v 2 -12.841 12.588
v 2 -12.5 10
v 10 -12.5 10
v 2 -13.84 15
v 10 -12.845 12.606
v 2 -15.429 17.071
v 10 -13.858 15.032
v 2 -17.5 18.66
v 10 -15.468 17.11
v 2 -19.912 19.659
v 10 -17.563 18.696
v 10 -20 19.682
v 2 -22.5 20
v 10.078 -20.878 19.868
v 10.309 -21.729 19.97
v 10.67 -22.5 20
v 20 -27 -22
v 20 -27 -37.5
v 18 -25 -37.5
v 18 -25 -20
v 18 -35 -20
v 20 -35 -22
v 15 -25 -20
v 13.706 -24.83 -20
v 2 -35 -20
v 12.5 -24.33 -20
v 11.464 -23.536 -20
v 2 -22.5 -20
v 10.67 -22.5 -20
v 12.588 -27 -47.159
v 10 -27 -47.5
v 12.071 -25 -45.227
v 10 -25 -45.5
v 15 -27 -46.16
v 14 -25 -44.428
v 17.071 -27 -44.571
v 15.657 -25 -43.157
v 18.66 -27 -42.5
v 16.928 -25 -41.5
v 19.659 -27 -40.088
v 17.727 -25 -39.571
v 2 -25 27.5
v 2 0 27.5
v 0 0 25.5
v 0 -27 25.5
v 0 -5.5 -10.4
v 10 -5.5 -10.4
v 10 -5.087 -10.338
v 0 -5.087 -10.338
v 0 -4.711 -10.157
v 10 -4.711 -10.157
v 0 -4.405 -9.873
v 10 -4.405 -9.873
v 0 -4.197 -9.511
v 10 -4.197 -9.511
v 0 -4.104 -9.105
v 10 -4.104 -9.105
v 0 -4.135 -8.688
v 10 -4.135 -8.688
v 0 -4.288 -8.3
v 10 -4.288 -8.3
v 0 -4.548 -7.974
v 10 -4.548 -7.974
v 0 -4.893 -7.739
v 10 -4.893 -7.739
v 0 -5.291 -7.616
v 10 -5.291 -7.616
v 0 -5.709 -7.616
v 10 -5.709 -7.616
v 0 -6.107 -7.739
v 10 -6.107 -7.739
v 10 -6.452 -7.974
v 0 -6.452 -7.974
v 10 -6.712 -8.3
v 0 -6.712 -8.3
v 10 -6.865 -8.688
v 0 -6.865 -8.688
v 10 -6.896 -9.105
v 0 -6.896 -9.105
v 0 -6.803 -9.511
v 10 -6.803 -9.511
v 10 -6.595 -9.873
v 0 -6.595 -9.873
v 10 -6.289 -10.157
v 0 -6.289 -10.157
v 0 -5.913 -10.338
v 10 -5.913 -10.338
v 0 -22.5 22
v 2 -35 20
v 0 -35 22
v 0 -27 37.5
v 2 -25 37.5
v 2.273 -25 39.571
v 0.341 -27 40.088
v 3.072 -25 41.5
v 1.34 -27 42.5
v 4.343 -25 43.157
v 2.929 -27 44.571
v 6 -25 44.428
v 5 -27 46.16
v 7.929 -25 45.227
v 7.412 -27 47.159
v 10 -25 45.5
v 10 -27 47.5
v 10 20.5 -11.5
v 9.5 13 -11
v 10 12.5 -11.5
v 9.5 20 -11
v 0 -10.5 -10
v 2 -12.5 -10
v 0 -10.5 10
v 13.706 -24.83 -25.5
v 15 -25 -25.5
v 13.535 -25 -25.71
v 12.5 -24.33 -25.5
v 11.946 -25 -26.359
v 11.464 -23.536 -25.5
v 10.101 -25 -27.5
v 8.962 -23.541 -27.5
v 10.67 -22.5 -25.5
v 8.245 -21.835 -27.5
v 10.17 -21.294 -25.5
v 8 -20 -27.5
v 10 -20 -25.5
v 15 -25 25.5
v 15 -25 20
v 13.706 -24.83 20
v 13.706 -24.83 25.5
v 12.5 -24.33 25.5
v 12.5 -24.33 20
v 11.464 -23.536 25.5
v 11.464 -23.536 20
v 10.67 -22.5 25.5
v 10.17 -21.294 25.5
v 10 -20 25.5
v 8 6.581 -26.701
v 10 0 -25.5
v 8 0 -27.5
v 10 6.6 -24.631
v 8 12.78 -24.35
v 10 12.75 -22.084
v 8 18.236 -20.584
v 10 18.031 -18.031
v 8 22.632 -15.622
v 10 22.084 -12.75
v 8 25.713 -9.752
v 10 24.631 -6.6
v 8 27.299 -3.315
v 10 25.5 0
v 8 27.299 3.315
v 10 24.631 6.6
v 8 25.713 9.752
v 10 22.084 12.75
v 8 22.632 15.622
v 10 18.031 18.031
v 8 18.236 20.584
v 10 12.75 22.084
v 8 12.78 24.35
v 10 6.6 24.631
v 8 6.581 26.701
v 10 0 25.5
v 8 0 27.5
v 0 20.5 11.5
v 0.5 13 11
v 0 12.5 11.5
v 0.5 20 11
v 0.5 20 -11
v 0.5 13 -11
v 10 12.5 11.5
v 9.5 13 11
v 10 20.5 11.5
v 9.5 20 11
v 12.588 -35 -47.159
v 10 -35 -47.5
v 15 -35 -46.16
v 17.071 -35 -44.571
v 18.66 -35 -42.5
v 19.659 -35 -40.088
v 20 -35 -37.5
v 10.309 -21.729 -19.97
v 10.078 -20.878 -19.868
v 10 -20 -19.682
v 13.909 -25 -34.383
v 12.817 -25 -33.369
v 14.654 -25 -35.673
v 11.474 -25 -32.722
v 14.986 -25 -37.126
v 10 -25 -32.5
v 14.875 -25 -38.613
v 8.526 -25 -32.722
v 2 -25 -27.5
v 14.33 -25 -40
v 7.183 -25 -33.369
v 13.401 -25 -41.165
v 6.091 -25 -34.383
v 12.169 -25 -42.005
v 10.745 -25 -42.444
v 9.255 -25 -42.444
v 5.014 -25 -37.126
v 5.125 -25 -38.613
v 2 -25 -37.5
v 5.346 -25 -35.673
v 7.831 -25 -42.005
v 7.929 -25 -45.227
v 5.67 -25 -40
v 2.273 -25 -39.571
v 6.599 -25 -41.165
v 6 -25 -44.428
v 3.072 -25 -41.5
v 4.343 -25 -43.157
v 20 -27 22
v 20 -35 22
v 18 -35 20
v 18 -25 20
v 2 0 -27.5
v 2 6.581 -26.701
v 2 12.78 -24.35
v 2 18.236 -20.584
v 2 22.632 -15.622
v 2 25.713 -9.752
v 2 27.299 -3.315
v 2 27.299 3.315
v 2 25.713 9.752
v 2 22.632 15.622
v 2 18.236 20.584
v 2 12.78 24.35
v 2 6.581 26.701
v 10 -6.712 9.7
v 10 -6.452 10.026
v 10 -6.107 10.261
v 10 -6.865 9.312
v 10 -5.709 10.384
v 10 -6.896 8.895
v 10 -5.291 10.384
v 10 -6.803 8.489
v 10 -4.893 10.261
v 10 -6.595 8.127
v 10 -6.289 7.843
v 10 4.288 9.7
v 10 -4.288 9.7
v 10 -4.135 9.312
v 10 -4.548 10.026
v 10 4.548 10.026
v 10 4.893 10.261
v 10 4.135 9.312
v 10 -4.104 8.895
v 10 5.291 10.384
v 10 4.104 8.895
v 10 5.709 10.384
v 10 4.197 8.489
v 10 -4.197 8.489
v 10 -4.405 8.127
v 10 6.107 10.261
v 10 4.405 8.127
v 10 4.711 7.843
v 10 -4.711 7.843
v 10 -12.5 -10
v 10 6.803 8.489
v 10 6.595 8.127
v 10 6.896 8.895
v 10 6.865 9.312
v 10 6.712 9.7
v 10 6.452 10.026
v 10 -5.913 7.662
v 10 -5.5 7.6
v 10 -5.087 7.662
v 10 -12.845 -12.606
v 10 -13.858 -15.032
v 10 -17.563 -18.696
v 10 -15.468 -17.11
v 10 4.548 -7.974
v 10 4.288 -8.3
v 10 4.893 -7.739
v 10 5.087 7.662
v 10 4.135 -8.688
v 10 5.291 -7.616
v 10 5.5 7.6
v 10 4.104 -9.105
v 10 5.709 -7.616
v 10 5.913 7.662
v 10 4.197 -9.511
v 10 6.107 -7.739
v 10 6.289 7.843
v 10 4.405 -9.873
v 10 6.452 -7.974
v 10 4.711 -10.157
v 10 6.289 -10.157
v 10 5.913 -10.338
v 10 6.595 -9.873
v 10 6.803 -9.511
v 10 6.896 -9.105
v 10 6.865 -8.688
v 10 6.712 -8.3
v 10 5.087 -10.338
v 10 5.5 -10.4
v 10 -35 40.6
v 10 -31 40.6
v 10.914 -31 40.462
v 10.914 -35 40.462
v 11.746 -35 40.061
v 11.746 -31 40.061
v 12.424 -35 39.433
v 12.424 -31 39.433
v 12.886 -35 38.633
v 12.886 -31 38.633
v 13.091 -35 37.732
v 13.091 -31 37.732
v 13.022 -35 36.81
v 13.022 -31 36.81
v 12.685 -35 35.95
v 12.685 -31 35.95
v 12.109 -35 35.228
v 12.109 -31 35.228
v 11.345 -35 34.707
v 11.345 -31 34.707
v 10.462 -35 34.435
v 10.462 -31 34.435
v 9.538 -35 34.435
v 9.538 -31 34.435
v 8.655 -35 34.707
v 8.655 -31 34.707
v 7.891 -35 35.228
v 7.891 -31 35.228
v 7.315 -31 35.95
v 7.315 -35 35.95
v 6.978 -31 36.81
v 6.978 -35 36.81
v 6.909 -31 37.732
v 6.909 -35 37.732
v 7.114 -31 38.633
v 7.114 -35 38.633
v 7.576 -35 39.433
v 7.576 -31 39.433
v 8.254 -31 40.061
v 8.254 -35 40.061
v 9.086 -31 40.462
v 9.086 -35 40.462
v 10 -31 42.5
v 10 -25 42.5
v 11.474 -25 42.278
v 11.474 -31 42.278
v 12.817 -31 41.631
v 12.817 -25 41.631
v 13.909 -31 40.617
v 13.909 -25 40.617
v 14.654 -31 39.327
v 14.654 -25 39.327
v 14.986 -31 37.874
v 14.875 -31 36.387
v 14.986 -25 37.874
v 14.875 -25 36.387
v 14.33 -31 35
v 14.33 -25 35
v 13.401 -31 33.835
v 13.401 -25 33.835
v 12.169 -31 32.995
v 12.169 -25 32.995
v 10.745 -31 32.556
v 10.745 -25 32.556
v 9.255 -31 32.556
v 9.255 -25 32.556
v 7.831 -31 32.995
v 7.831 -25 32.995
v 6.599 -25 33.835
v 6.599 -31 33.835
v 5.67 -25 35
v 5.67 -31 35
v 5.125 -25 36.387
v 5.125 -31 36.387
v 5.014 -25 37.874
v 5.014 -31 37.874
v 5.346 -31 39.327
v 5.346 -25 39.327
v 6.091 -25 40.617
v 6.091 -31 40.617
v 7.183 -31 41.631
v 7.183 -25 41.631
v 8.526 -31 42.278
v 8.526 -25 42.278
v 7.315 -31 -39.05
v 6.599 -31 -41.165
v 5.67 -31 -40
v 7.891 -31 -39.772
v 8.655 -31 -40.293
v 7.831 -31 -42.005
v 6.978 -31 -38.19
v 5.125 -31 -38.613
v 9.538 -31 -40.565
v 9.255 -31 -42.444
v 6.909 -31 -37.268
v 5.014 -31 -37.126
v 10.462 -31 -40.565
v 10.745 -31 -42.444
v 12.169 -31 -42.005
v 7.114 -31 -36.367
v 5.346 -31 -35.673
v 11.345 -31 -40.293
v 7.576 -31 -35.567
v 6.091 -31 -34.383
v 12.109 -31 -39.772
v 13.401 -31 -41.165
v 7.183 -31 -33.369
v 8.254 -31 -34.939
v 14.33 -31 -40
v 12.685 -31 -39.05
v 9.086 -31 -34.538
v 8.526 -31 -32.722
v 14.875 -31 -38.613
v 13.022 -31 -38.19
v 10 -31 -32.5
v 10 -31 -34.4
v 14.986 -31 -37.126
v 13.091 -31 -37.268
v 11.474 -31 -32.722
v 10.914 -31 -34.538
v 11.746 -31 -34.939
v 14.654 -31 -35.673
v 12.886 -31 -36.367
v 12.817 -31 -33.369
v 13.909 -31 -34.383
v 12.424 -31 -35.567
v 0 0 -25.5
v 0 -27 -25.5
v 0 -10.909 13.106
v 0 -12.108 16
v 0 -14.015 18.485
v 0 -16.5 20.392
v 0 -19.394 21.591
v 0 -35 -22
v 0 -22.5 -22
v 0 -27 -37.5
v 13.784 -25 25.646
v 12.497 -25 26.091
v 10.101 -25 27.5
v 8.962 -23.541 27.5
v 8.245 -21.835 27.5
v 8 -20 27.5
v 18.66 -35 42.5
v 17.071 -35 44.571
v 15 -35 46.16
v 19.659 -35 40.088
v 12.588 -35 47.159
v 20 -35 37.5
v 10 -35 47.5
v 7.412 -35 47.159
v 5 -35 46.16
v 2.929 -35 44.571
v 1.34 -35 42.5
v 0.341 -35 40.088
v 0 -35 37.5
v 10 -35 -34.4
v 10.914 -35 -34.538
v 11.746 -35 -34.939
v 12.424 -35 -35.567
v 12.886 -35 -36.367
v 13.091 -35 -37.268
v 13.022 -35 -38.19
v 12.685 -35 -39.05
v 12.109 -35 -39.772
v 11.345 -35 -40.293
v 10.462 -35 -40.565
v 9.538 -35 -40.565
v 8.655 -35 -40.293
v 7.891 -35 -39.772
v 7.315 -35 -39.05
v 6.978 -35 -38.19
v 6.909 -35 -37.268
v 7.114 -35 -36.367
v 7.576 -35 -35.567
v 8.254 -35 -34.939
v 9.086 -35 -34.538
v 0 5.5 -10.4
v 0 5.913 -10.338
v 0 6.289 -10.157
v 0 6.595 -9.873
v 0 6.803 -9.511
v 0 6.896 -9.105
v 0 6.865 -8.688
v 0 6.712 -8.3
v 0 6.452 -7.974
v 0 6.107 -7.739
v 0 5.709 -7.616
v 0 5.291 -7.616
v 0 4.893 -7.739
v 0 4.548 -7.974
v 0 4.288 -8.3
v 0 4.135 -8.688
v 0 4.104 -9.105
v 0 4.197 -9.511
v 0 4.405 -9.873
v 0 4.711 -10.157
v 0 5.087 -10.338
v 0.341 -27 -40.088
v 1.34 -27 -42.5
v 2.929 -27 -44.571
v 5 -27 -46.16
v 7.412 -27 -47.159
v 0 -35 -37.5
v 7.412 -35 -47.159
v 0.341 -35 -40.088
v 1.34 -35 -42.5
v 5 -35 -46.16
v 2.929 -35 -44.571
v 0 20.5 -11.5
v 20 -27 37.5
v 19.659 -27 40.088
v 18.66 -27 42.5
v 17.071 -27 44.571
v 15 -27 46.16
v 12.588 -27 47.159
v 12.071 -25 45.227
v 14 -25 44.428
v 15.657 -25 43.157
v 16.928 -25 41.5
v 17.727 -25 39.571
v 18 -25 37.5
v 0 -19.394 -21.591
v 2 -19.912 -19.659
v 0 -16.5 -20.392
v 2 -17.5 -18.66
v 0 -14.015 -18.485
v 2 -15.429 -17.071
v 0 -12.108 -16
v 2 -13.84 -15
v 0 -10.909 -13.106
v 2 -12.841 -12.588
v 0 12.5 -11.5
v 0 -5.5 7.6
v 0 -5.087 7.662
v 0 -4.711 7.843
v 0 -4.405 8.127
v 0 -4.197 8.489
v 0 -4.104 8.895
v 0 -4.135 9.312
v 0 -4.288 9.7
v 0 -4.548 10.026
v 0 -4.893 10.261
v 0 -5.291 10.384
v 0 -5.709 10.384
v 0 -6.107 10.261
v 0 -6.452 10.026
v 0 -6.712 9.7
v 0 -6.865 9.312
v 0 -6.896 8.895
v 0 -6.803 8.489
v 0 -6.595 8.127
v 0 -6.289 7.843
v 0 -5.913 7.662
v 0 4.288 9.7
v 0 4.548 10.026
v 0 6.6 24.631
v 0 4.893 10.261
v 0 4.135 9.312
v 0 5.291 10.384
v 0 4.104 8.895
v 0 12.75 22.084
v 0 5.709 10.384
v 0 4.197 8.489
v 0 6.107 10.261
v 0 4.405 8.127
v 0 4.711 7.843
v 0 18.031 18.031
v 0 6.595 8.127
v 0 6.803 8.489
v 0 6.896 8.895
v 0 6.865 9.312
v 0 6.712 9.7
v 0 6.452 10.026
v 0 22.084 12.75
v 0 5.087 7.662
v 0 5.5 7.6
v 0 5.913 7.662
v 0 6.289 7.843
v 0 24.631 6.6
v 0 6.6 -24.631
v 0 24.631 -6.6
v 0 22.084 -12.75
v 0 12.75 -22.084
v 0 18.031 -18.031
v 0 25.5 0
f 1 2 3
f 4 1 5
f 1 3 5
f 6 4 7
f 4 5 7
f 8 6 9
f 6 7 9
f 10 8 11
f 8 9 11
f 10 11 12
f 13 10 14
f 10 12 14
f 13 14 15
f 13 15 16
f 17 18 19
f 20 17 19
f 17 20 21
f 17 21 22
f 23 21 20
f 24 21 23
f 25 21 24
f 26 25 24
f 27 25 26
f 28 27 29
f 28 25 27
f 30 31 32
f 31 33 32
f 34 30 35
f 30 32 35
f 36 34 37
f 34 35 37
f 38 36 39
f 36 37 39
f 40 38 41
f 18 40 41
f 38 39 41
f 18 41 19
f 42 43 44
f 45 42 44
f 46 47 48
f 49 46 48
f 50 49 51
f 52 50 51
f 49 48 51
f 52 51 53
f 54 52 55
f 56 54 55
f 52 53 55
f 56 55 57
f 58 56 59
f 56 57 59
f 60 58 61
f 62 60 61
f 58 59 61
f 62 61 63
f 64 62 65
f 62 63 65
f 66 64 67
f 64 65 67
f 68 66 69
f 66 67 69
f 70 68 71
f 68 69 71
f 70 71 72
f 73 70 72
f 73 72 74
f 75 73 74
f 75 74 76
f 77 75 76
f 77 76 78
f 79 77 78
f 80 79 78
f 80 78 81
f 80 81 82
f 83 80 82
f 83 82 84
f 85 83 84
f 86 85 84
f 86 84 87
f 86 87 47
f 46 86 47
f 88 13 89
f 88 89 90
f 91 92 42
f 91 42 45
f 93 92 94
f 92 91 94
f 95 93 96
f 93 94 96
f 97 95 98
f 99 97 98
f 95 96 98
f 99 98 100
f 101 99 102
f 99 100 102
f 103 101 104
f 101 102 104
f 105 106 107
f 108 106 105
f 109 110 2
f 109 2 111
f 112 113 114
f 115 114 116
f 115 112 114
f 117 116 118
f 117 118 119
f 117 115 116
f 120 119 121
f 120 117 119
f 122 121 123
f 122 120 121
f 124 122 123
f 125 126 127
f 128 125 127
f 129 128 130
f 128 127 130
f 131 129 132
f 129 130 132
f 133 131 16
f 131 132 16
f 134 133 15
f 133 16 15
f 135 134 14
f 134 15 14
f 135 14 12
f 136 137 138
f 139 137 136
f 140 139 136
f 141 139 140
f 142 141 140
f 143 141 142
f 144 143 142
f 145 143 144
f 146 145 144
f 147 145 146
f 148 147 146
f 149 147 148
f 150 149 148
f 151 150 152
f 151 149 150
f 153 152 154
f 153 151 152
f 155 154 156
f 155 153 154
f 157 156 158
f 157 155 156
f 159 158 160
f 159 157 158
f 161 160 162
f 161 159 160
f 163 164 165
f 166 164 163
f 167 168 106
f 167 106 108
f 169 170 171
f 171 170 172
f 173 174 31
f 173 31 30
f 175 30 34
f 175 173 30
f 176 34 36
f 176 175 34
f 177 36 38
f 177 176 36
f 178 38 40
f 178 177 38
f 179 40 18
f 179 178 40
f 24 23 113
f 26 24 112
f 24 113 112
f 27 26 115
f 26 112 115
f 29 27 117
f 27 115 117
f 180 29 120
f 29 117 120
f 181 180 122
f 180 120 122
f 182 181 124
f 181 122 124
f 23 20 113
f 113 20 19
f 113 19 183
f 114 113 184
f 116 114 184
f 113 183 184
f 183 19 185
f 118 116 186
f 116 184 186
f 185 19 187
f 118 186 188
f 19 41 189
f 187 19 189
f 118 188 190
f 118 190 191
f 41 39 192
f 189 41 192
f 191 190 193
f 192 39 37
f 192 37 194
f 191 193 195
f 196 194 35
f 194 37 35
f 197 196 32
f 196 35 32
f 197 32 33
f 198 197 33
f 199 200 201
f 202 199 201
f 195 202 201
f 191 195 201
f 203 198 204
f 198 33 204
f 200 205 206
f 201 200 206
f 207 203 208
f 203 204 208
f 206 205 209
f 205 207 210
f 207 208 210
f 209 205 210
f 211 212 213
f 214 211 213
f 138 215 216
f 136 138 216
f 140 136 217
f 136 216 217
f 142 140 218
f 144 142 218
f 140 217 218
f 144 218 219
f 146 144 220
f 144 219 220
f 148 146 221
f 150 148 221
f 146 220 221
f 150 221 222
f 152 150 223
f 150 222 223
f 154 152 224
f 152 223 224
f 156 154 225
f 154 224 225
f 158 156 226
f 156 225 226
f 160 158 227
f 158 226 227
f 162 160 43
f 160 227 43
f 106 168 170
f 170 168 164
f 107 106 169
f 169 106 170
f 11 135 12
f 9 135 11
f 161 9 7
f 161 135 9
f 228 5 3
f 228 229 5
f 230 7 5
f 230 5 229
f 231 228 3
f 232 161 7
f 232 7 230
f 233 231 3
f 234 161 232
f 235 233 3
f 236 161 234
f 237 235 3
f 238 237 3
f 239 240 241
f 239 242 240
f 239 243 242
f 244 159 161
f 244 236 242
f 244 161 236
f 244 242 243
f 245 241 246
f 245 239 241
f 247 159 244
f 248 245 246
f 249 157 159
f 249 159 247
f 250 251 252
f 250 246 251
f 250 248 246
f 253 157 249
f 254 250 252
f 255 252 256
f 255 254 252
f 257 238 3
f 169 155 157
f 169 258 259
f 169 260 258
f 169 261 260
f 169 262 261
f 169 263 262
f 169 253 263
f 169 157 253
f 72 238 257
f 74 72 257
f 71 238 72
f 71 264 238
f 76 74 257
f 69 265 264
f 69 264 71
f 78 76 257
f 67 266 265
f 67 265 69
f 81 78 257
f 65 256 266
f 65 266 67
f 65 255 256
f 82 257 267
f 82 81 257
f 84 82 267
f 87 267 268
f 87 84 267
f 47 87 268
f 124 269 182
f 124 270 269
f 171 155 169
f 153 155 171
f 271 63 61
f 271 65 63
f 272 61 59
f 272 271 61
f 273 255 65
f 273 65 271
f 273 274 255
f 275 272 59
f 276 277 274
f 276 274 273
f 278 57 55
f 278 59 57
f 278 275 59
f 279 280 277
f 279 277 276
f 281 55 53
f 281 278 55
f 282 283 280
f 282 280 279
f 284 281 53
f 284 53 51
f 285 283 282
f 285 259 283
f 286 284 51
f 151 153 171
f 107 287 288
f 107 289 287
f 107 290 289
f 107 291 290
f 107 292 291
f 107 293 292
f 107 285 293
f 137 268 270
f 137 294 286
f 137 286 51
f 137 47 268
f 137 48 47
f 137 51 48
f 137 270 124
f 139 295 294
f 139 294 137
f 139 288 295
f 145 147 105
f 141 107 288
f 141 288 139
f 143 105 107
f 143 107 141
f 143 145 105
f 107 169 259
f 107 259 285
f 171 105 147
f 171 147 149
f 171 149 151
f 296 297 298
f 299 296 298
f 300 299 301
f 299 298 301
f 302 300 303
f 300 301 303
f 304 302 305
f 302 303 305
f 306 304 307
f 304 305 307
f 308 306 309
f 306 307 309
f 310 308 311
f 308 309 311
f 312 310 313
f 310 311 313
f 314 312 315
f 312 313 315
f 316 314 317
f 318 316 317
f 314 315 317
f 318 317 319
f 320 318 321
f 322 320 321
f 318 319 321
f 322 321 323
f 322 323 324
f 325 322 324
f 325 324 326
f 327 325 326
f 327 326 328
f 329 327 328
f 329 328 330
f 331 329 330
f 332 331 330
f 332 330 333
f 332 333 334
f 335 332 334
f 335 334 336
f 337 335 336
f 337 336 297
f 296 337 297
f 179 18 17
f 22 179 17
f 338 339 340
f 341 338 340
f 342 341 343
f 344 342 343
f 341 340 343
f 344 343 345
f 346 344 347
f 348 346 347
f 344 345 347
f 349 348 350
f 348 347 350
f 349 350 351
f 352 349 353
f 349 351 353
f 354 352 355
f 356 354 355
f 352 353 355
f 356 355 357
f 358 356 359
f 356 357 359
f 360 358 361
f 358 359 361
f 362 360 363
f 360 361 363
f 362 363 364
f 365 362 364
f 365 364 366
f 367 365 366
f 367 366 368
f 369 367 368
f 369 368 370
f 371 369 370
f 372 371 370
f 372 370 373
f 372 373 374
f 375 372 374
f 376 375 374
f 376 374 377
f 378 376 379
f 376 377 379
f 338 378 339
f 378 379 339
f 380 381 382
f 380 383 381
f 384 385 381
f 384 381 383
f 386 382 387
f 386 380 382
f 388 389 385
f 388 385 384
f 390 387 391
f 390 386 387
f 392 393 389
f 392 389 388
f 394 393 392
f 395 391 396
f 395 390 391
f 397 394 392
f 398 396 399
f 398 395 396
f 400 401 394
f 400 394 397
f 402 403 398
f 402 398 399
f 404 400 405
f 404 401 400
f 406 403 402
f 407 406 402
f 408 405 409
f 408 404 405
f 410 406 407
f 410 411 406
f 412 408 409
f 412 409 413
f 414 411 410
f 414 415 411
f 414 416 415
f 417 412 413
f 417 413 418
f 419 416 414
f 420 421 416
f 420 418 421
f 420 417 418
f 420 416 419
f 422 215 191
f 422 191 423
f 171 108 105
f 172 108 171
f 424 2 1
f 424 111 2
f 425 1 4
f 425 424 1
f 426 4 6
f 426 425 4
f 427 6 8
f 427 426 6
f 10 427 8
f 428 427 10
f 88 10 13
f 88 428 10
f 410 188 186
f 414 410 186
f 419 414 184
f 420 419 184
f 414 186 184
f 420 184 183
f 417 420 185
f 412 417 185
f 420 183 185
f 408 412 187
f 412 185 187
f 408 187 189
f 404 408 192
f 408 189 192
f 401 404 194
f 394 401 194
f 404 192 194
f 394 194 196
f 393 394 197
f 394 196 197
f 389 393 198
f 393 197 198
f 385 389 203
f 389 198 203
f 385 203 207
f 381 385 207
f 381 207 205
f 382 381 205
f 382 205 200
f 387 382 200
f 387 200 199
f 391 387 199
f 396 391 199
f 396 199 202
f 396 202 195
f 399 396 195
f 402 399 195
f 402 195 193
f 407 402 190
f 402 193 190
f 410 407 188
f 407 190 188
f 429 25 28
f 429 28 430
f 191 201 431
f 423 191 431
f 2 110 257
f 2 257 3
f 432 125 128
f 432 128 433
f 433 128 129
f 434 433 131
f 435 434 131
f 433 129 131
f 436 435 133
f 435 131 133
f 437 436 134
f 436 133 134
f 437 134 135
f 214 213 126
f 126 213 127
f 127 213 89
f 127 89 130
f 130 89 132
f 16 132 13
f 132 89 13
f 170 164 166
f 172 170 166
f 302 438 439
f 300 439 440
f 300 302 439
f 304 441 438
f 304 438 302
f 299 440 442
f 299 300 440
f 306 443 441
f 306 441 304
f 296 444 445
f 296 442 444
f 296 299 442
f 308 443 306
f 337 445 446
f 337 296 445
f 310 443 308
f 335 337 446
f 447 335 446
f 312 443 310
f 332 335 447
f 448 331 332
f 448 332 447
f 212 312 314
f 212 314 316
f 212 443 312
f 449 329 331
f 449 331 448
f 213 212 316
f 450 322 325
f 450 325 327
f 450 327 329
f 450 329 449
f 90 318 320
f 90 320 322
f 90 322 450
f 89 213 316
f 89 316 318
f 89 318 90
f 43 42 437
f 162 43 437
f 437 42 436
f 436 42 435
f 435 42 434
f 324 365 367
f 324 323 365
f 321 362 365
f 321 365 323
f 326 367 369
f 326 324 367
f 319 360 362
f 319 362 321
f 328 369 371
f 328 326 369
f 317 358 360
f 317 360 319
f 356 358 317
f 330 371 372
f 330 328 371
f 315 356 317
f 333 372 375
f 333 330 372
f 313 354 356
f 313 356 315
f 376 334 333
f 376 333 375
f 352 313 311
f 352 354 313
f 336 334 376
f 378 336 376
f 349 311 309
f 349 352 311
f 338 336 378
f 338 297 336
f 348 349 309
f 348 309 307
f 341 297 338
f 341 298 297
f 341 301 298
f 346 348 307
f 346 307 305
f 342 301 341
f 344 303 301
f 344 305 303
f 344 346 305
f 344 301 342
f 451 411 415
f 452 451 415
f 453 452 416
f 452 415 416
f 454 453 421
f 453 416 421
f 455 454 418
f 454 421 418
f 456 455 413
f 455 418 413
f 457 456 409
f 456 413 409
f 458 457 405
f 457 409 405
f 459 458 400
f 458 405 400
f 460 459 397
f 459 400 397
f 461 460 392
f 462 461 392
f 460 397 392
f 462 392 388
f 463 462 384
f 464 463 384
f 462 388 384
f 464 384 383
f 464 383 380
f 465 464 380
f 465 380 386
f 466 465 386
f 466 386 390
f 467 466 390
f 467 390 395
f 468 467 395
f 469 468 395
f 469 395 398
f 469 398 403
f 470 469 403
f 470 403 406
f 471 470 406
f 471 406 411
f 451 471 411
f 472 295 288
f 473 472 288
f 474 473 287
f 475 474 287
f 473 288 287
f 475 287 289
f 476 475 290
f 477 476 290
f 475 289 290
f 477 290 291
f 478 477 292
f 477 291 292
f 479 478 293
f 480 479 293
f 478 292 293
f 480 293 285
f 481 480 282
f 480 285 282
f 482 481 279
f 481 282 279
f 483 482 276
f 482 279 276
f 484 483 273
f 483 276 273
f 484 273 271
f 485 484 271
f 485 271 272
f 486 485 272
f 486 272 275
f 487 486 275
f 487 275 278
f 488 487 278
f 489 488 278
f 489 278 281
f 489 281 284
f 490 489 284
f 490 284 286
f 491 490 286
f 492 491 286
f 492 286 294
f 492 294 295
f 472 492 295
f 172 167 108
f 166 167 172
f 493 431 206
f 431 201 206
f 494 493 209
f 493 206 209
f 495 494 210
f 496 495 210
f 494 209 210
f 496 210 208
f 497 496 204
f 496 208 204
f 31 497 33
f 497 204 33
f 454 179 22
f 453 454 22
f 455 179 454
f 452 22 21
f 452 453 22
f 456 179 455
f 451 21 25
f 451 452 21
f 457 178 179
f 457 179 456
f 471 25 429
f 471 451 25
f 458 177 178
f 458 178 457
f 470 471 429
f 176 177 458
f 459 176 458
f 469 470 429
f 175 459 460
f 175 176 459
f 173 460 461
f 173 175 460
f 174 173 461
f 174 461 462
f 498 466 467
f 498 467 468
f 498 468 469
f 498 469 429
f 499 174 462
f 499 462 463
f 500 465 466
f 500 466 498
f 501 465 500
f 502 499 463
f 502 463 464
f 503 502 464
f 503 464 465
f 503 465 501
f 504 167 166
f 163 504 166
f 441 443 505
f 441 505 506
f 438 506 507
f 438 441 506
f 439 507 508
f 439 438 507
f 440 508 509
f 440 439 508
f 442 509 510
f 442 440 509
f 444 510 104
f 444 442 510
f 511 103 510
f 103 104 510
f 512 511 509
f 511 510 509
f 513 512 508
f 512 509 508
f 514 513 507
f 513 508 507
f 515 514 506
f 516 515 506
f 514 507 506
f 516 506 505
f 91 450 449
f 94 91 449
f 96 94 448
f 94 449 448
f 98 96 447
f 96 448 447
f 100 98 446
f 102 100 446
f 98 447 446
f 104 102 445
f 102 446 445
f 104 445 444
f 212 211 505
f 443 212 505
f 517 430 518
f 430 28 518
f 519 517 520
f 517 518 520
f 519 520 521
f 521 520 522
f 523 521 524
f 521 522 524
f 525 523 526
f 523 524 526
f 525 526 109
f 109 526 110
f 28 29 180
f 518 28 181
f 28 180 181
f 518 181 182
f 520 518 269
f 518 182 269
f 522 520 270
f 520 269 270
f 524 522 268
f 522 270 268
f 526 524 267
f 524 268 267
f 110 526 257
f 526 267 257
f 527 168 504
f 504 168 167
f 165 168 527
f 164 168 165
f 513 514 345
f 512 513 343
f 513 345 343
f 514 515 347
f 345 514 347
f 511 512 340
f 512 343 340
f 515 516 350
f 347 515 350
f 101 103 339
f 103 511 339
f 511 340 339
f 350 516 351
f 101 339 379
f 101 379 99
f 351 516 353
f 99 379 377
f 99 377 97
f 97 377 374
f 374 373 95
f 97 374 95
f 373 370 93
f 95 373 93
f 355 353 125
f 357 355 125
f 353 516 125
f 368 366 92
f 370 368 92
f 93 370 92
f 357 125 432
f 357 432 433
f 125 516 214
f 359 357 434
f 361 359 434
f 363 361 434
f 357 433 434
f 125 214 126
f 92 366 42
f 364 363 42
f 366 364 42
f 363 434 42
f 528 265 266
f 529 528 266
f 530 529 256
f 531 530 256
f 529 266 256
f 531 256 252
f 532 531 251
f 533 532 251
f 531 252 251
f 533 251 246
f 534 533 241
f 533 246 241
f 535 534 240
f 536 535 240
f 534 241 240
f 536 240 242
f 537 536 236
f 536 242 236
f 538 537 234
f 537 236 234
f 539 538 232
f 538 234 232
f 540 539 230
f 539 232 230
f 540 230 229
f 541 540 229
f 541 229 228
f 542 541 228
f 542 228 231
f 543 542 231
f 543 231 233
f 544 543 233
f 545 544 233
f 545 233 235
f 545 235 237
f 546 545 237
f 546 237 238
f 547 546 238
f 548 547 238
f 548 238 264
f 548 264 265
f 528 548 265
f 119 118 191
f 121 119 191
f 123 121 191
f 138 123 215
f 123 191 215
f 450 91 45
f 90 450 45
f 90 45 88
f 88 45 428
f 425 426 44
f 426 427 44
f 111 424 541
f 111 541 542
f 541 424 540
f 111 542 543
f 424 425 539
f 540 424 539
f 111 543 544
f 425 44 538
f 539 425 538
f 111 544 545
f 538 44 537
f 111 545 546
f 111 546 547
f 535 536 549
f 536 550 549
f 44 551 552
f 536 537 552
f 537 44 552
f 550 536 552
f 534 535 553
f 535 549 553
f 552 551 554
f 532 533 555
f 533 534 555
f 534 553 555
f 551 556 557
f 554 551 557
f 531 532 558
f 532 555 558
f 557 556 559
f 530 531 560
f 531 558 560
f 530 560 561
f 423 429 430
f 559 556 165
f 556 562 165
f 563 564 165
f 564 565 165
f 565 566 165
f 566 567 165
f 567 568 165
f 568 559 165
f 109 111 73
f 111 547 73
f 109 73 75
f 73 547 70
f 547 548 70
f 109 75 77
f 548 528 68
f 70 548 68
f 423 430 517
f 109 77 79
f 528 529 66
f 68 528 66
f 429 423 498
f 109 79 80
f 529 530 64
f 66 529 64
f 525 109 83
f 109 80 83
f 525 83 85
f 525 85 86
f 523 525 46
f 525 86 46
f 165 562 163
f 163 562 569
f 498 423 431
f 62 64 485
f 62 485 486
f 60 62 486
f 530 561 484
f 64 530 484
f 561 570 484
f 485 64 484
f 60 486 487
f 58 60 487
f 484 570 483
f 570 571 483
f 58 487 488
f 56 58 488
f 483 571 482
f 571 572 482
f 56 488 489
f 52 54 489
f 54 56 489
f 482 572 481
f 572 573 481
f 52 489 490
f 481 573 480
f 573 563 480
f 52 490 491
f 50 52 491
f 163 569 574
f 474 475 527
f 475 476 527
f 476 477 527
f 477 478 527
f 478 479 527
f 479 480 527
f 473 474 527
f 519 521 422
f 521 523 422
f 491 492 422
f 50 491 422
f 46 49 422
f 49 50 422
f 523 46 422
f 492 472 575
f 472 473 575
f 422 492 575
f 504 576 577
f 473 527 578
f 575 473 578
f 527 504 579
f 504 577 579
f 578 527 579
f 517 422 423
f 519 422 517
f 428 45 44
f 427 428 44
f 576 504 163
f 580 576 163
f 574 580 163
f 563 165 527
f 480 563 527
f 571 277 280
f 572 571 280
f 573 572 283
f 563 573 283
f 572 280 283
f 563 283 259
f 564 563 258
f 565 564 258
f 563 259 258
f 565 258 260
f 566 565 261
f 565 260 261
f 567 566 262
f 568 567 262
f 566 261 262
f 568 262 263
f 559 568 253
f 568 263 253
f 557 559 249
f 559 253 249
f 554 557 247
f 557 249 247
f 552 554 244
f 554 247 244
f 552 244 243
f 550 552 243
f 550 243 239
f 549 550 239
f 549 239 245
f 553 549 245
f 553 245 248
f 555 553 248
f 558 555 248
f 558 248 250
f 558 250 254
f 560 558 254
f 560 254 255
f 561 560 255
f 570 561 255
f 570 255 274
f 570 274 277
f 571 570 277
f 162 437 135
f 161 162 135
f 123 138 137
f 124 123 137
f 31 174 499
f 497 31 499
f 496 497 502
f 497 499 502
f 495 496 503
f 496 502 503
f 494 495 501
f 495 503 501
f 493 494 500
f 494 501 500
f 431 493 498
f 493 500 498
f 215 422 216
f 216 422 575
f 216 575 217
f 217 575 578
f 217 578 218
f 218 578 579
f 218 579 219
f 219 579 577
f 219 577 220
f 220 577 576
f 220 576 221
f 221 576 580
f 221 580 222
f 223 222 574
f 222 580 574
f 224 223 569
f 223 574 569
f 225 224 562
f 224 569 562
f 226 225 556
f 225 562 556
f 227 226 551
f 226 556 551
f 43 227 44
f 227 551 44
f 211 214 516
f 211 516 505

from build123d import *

# Parameters (mm, degrees)
EXTRUDE_1_DEPTH     = 10
SKETCH_2_R          = 1.4
CUT_EXTRUDE_1_DEPTH = 72.282887147
SKETCH_4_W          = 22
SKETCH_4_H          = 7
CUT_EXTRUDE_4_DEPTH = 10
CHAMFER_2_SIZE      = 0.5
SKETCH_5_W          = 10
SKETCH_5_H          = 55
CUT_EXTRUDE_5_DEPTH = 40
EXTRUDE_2_DEPTH     = 10
FILLET_1_R          = 10
SKETCH_7_R          = 5
CUT_EXTRUDE_6_DEPTH = 6
SKETCH_8_R          = 3.1
CUT_EXTRUDE_7_DEPTH = 6
SKETCH_9_W          = 40
SKETCH_9_H          = 45
CUT_EXTRUDE_8_DEPTH = 63.299678972
FILLET_2_R          = 10
FILLET_3_R          = 5
CHAMFER_3_SIZE      = 2


# Some blends are built 0.0001 mm under size
with BuildPart() as part:
    # 草图1 → 凸台-拉伸1 (new body)
    with BuildSketch(Plane(origin=(0, 0, 0), x_dir=(0, 0, -1), z_dir=(1, 0, 0))):
        with BuildLine():
            Line((-27.5, 0), (-27.5, -65))
            Line((-27.5, -65), (27.5, -65))
            Line((27.5, -65), (27.5, 0))
            ThreePointArc((27.5, 0), (0, 27.5), (-27.5, 0))
        make_face()
    extrude(amount=EXTRUDE_1_DEPTH)

    # 草图2 → 切除-拉伸1 (cut, through all)
    with BuildSketch(Plane(origin=(10, 0, 0), x_dir=(0, 0, -1), z_dir=(1, 0, 0))):
        with Locations((-9, 5.5)):
            Circle(SKETCH_2_R)
        with Locations((9, 5.5)):
            Circle(SKETCH_2_R)
        with Locations((9, -5.5)):
            Circle(SKETCH_2_R)
        with Locations((-9, -5.5)):
            Circle(SKETCH_2_R)
    extrude(amount=-CUT_EXTRUDE_1_DEPTH, mode=Mode.SUBTRACT)

    # 草图4 → 切除-拉伸4 (cut)
    with BuildSketch(Plane.ZY):
        with Locations((0, 16.5)):
            Rectangle(SKETCH_4_W, SKETCH_4_H)
    extrude(amount=-CUT_EXTRUDE_4_DEPTH, mode=Mode.SUBTRACT)

    # 倒角2
    chamfer_2_edges = [part.edges().sort_by_distance(p)[0] for p in [
        (10, 16.5, -11),
        (10, 20, 0),
        (10, 16.5, 11),
        (10, 13, 0),
        (0, 16.5, -11),
        (0, 13, 0),
        (0, 16.5, 11),
        (0, 20, 0),
    ]]
    chamfer(chamfer_2_edges, length=CHAMFER_2_SIZE)

    # 草图5 → 切除-拉伸5 (cut)
    with BuildSketch(Plane(origin=(0, -65, 0), x_dir=(-1, 0, 0), z_dir=(0, -1, 0))):
        with Locations((-5, 0)):
            Rectangle(SKETCH_5_W, SKETCH_5_H)
    extrude(amount=-CUT_EXTRUDE_5_DEPTH, mode=Mode.SUBTRACT)

    # 草图6 → 凸台-拉伸2 (add)
    with BuildSketch(Plane(origin=(0, -25, 0), x_dir=(-1, 0, 0), z_dir=(0, -1, 0))):
        Polygon((0, -27.5), (0, 27.5), (0, 47.5), (-20, 47.5), (-20, 27.5), (-20, -27.5), (-20, -47.5), (0, -47.5), align=None)
    extrude(amount=EXTRUDE_2_DEPTH)

    # 圆角1
    fillet_1_edges = [part.edges().sort_by_distance(p)[0] for p in [
        (0, -30, -47.5),
        (20, -30, -47.5),
        (0, -30, 47.5),
        (20, -30, 47.5),
    ]]
    fillet(fillet_1_edges, radius=FILLET_1_R - 0.0001)  # a hair under: the kernel refuses the full size

    # 草图7 → 切除-拉伸6 (cut)
    with BuildSketch(Plane(origin=(0, -25, 0), x_dir=(1, 0, 0), z_dir=(0, 1, 0))):
        with Locations(Location((10, 37.5, 0), (0, 0, 270))):
            Circle(SKETCH_7_R)
        with Locations(Location((10, -37.5, 0), (0, 0, 270))):
            Circle(SKETCH_7_R)
    extrude(amount=-CUT_EXTRUDE_6_DEPTH, mode=Mode.SUBTRACT)

    # 草图8 → 切除-拉伸7 (cut)
    with BuildSketch(Plane(origin=(0, -31, 0), x_dir=(1, 0, 0), z_dir=(0, 1, 0))):
        with Locations(Location((10, 37.5, 0), (0, 0, 270))):
            Circle(SKETCH_8_R)
        with Locations(Location((10, -37.5, 0), (0, 0, 270))):
            Circle(SKETCH_8_R)
    extrude(amount=-CUT_EXTRUDE_7_DEPTH, mode=Mode.SUBTRACT)

    # 草图9 → 切除-拉伸8 (cut, through all)
    with BuildSketch(Plane.ZY):
        with Locations((0, -35)):
            Rectangle(SKETCH_9_W, SKETCH_9_H)
    extrude(amount=-CUT_EXTRUDE_8_DEPTH, mode=Mode.SUBTRACT)

    # 圆角2
    fillet_2_edges = [part.edges().sort_by_distance(p)[0] for p in [
        (5, -12.5, 20),
        (5, -12.5, -20),
    ]]
    fillet(fillet_2_edges, radius=FILLET_2_R)

    # 圆角3
    fillet_3_edges = [part.edges().sort_by_distance(p)[0] for p in [
        (10, -25, -23.75),
        (10, -25, 23.75),
    ]]
    fillet(fillet_3_edges, radius=FILLET_3_R)

    # 倒角3
    # the kernel refuses this chamfer: 2 mm, written as the material it takes off along each edge
    with BuildSketch(Plane(origin=(0, -25, 37.5001), x_dir=(1, 0, 0), z_dir=(0, 0, -1)), Plane(origin=(0, -25, -27.5), x_dir=(1, 0, 0), z_dir=(0, 0, -1))) as chamfer_3_piece_1:
        Polygon((CHAMFER_3_SIZE, 0), (0, CHAMFER_3_SIZE), (0, 0), align=None)
    extrude(amount=10.0001, mode=Mode.SUBTRACT)
    with BuildSketch(Plane(origin=(20, -25, -37.5001), x_dir=(0, -1, 0), z_dir=(0, 0, 1))) as chamfer_3_piece_2:
        Polygon((CHAMFER_3_SIZE, 0), (0, -CHAMFER_3_SIZE), (0, 0), align=None)
    extrude(amount=22.643465976, mode=Mode.SUBTRACT)
    with BuildSketch(Plane(origin=(10.0001, -25, 37.5001), x_dir=(0, 0, 1), z_dir=(-1, 0, 0))) as chamfer_3_piece_3:
        Polygon((9.9999 - CHAMFER_3_SIZE, 0), (9.9999, -CHAMFER_3_SIZE), (9.9999, 0), align=None)
    revolve(axis=Axis((10.0001, -25, 37.5001), (0, 1, 0)), revolution_arc=90, mode=Mode.SUBTRACT)
    with BuildSketch(Plane(origin=(9.9999, -25, 37.5001), x_dir=(-1, 0, 0), z_dir=(0, 0, -1))) as chamfer_3_piece_4:
        Polygon((9.9999 - CHAMFER_3_SIZE, 0), (9.9999, -CHAMFER_3_SIZE), (9.9999, 0), align=None)
    revolve(axis=Axis((9.9999, -25, 37.5001), (0, 1, 0)), revolution_arc=90, mode=Mode.SUBTRACT)
    with BuildSketch(Plane(origin=(10.0001, -25, -37.5001), x_dir=(0, 0, -1), z_dir=(-1, 0, 0))) as chamfer_3_piece_5:
        Polygon((9.9999, CHAMFER_3_SIZE), (9.9999 - CHAMFER_3_SIZE, 0), (9.9999, 0), align=None)
    revolve(axis=Axis((10.0001, -25, -37.5001), (0, -1, 0)), revolution_arc=90, mode=Mode.SUBTRACT)
    with BuildSketch(Plane(origin=(9.9999, -25, -37.5001), x_dir=(-1, 0, 0), z_dir=(0, 0, 1))) as chamfer_3_piece_6:
        Polygon((9.9999, CHAMFER_3_SIZE), (9.9999 - CHAMFER_3_SIZE, 0), (9.9999, 0), align=None)
    revolve(axis=Axis((9.9999, -25, -37.5001), (0, -1, 0)), revolution_arc=90, mode=Mode.SUBTRACT)
    with BuildSketch(Plane(origin=(20, -25, 14.856634024), x_dir=(-1, 0, 0), z_dir=(0, 0, 1))) as chamfer_3_piece_7:
        Polygon((CHAMFER_3_SIZE, 0), (0, CHAMFER_3_SIZE), (0, 0), align=None)
    extrude(amount=22.643465976, mode=Mode.SUBTRACT)
    with BuildSketch(Plane(origin=(0, -40.143365976, 20), x_dir=(1, 0, 0), z_dir=(0, 1, 0)), Plane(origin=(0, -22.5, -20), x_dir=(1, 0, 0), z_dir=(0, -1, 0))) as chamfer_3_piece_8:
        Polygon((CHAMFER_3_SIZE, 0), (0, -CHAMFER_3_SIZE), (0, 0), align=None)
    extrude(amount=17.643365976, mode=Mode.SUBTRACT)
    with BuildSketch(Plane(origin=(20, -40.143365976, 20), x_dir=(0, 0, 1), z_dir=(0, 1, 0))) as chamfer_3_piece_9:
        Polygon((CHAMFER_3_SIZE, 0), (0, -CHAMFER_3_SIZE), (0, 0), align=None)
    extrude(amount=20.286731952, mode=Mode.SUBTRACT)
    with BuildSketch(Plane(origin=(20, -19.856634024, -20), x_dir=(-1, 0, 0), z_dir=(0, -1, 0))) as chamfer_3_piece_10:
        Polygon((CHAMFER_3_SIZE, 0), (0, CHAMFER_3_SIZE), (0, 0), align=None)
    extrude(amount=20.286731952, mode=Mode.SUBTRACT)
    with BuildSketch(Plane(origin=(0, -12.5, 10), x_dir=(1, 0, 0), z_dir=(0, 0, -1))) as chamfer_3_piece_11:
        Polygon((CHAMFER_3_SIZE, 0), (0, -CHAMFER_3_SIZE), (0, 0), align=None)
    extrude(amount=20, mode=Mode.SUBTRACT)
    with BuildSketch(Plane(origin=(0, -22.5, -10), x_dir=(0, 0, -1), z_dir=(0, -1, 0))) as chamfer_3_piece_12:
        Polygon((10 + CHAMFER_3_SIZE, 0), (10, CHAMFER_3_SIZE), (10, 0), align=None)
    revolve(axis=Axis((0, -22.5, -10), (1, 0, 0)), revolution_arc=90, mode=Mode.SUBTRACT)
    with BuildSketch(Plane(origin=(0, -22.5, 10), x_dir=(0, 1, 0), z_dir=(0, 0, -1))) as chamfer_3_piece_13:
        Polygon((10, CHAMFER_3_SIZE), (10 + CHAMFER_3_SIZE, 0), (10, 0), align=None)
    revolve(axis=Axis((0, -22.5, 10), (1, 0, 0)), revolution_arc=90, mode=Mode.SUBTRACT)
    with BuildSketch(Plane(origin=(10, -20, -27.5), x_dir=(-1, 0, 0), z_dir=(0, 1, 0)), Plane(origin=(10, 0, 27.5), x_dir=(-1, 0, 0), z_dir=(0, -1, 0))) as chamfer_3_piece_14:
        Polygon((CHAMFER_3_SIZE, 0), (0, CHAMFER_3_SIZE), (0, 0), align=None)
    extrude(amount=20, mode=Mode.SUBTRACT)
    with BuildSketch(Plane(origin=(15, -20, -27.5), x_dir=(0.8568283041143762, -0.5156018398614208, 0), z_dir=(0.5156018398614208, 0.8568283041143762, 0))) as chamfer_3_piece_15_section:
        Polygon((5 + CHAMFER_3_SIZE, 0), (5, -CHAMFER_3_SIZE), (5, 0), align=None)
    chamfer_3_piece_15 = revolve(axis=Axis((15, -20, -27.5), (0, 0, -1)), revolution_arc=148.962308712, mode=Mode.PRIVATE)
    chamfer_3_piece_15 = split(chamfer_3_piece_15, bisect_by=Plane(origin=(15, -25, -27.5), z_dir=(0, 1, 0)), keep=Keep.TOP, mode=Mode.PRIVATE)
    add(chamfer_3_piece_15, mode=Mode.SUBTRACT)
    with BuildSketch(Plane(origin=(15, -20, 27.5), x_dir=(0.8568283041143756, -0.5156018398614214, 0), z_dir=(0.5156018398614214, 0.8568283041143756, 0))) as chamfer_3_piece_16_section:
        Polygon((5 + CHAMFER_3_SIZE, 0), (5, CHAMFER_3_SIZE), (5, 0), align=None)
    chamfer_3_piece_16 = revolve(axis=Axis((15, -20, 27.5), (0, 0, -1)), revolution_arc=148.962308712, mode=Mode.PRIVATE)
    chamfer_3_piece_16 = split(chamfer_3_piece_16, bisect_by=Plane(origin=(15, -25, 27.5), z_dir=(0, 1, 0)), keep=Keep.TOP, mode=Mode.PRIVATE)
    add(chamfer_3_piece_16, mode=Mode.SUBTRACT)
    with BuildSketch(Plane(origin=(10, 0, 0), x_dir=(0, 0, -1), z_dir=(0, -1, 0))) as chamfer_3_piece_17:
        Polygon((27.5, -CHAMFER_3_SIZE), (27.5 - CHAMFER_3_SIZE, 0), (27.5, 0), align=None)
    revolve(axis=Axis((10, 0, 0), (1, 0, 0)), revolution_arc=180, mode=Mode.SUBTRACT)
    with BuildSketch(Plane(origin=(0, 0, 27.5), x_dir=(1, 0, 0), z_dir=(0, -1, 0)), Plane(origin=(0, -25, -27.5), x_dir=(1, 0, 0), z_dir=(0, 1, 0))) as chamfer_3_piece_18:
        Polygon((CHAMFER_3_SIZE, 0), (0, -CHAMFER_3_SIZE), (0, 0), align=None)
    extrude(amount=25, mode=Mode.SUBTRACT)
    with BuildSketch(Plane(origin=(0, 0, 0), x_dir=(0, 0, -1), z_dir=(0, -1, 0))) as chamfer_3_piece_19:
        Polygon((27.5, CHAMFER_3_SIZE), (27.5 - CHAMFER_3_SIZE, 0), (27.5, 0), align=None)
    revolve(axis=Axis((0, 0, 0), (1, 0, 0)), revolution_arc=180, mode=Mode.SUBTRACT)
    with BuildSketch(Plane(origin=(9.9999, -25, -47.5), x_dir=(0, -1, 0), z_dir=(1, 0, 0))) as chamfer_3_piece_20:
        Polygon((CHAMFER_3_SIZE, 0), (0, -CHAMFER_3_SIZE), (0, 0), align=None)
    extrude(amount=0.0002, mode=Mode.SUBTRACT)
    with BuildSketch(Plane(origin=(10.0001, -25, 47.5), x_dir=(0, 0, -1), z_dir=(-1, 0, 0))) as chamfer_3_piece_21:
        Polygon((CHAMFER_3_SIZE, 0), (0, CHAMFER_3_SIZE), (0, 0), align=None)
    extrude(amount=0.0002, mode=Mode.SUBTRACT)
    with BuildSketch(Plane(origin=(0, 0, 27.5), x_dir=(1, 0, 0), z_dir=(0, -1, 0))) as chamfer_3_piece_22a_section:
        Polygon((CHAMFER_3_SIZE, 0), (0, -CHAMFER_3_SIZE), (0, 0), align=None)
    chamfer_3_piece_22a = extrude(amount=30.143365976, mode=Mode.PRIVATE)
    chamfer_3_piece_22a = split(chamfer_3_piece_22a, bisect_by=Plane(origin=(0, -25, 27.5), z_dir=(0, -1, 0)), keep=Keep.TOP, mode=Mode.PRIVATE)
    with BuildSketch(Plane(origin=(0, -25, 37.5001), x_dir=(1, 0, 0), z_dir=(0, 0, -1))) as chamfer_3_piece_22b_section:
        Polygon((CHAMFER_3_SIZE, 0), (0, CHAMFER_3_SIZE), (0, 0), align=None)
    chamfer_3_piece_22b = extrude(amount=15.143465976, mode=Mode.PRIVATE)
    chamfer_3_piece_22b = split(chamfer_3_piece_22b, bisect_by=Plane(origin=(0, -25, 27.5), z_dir=(0, 0, -1)), keep=Keep.TOP, mode=Mode.PRIVATE)
    chamfer_3_piece_22 = chamfer_3_piece_22a & chamfer_3_piece_22b
    add(chamfer_3_piece_22, mode=Mode.SUBTRACT)
    with BuildSketch(Plane(origin=(0, -25, -22.356634024), x_dir=(1, 0, 0), z_dir=(0, 0, -1))) as chamfer_3_piece_23a_section:
        Polygon((CHAMFER_3_SIZE, 0), (0, CHAMFER_3_SIZE), (0, 0), align=None)
    chamfer_3_piece_23a = extrude(amount=15.143465976, mode=Mode.PRIVATE)
    chamfer_3_piece_23a = split(chamfer_3_piece_23a, bisect_by=Plane(origin=(0, -25, -27.5), z_dir=(0, 0, 1)), keep=Keep.TOP, mode=Mode.PRIVATE)
    with BuildSketch(Plane(origin=(0, -30.143365976, -27.5), x_dir=(1, 0, 0), z_dir=(0, 1, 0))) as chamfer_3_piece_23b_section:
        Polygon((CHAMFER_3_SIZE, 0), (0, -CHAMFER_3_SIZE), (0, 0), align=None)
    chamfer_3_piece_23b = extrude(amount=30.143365976, mode=Mode.PRIVATE)
    chamfer_3_piece_23b = split(chamfer_3_piece_23b, bisect_by=Plane(origin=(0, -25, -27.5), z_dir=(0, -1, 0)), keep=Keep.TOP, mode=Mode.PRIVATE)
    chamfer_3_piece_23 = chamfer_3_piece_23a & chamfer_3_piece_23b
    add(chamfer_3_piece_23, mode=Mode.SUBTRACT)


solid = part.part
